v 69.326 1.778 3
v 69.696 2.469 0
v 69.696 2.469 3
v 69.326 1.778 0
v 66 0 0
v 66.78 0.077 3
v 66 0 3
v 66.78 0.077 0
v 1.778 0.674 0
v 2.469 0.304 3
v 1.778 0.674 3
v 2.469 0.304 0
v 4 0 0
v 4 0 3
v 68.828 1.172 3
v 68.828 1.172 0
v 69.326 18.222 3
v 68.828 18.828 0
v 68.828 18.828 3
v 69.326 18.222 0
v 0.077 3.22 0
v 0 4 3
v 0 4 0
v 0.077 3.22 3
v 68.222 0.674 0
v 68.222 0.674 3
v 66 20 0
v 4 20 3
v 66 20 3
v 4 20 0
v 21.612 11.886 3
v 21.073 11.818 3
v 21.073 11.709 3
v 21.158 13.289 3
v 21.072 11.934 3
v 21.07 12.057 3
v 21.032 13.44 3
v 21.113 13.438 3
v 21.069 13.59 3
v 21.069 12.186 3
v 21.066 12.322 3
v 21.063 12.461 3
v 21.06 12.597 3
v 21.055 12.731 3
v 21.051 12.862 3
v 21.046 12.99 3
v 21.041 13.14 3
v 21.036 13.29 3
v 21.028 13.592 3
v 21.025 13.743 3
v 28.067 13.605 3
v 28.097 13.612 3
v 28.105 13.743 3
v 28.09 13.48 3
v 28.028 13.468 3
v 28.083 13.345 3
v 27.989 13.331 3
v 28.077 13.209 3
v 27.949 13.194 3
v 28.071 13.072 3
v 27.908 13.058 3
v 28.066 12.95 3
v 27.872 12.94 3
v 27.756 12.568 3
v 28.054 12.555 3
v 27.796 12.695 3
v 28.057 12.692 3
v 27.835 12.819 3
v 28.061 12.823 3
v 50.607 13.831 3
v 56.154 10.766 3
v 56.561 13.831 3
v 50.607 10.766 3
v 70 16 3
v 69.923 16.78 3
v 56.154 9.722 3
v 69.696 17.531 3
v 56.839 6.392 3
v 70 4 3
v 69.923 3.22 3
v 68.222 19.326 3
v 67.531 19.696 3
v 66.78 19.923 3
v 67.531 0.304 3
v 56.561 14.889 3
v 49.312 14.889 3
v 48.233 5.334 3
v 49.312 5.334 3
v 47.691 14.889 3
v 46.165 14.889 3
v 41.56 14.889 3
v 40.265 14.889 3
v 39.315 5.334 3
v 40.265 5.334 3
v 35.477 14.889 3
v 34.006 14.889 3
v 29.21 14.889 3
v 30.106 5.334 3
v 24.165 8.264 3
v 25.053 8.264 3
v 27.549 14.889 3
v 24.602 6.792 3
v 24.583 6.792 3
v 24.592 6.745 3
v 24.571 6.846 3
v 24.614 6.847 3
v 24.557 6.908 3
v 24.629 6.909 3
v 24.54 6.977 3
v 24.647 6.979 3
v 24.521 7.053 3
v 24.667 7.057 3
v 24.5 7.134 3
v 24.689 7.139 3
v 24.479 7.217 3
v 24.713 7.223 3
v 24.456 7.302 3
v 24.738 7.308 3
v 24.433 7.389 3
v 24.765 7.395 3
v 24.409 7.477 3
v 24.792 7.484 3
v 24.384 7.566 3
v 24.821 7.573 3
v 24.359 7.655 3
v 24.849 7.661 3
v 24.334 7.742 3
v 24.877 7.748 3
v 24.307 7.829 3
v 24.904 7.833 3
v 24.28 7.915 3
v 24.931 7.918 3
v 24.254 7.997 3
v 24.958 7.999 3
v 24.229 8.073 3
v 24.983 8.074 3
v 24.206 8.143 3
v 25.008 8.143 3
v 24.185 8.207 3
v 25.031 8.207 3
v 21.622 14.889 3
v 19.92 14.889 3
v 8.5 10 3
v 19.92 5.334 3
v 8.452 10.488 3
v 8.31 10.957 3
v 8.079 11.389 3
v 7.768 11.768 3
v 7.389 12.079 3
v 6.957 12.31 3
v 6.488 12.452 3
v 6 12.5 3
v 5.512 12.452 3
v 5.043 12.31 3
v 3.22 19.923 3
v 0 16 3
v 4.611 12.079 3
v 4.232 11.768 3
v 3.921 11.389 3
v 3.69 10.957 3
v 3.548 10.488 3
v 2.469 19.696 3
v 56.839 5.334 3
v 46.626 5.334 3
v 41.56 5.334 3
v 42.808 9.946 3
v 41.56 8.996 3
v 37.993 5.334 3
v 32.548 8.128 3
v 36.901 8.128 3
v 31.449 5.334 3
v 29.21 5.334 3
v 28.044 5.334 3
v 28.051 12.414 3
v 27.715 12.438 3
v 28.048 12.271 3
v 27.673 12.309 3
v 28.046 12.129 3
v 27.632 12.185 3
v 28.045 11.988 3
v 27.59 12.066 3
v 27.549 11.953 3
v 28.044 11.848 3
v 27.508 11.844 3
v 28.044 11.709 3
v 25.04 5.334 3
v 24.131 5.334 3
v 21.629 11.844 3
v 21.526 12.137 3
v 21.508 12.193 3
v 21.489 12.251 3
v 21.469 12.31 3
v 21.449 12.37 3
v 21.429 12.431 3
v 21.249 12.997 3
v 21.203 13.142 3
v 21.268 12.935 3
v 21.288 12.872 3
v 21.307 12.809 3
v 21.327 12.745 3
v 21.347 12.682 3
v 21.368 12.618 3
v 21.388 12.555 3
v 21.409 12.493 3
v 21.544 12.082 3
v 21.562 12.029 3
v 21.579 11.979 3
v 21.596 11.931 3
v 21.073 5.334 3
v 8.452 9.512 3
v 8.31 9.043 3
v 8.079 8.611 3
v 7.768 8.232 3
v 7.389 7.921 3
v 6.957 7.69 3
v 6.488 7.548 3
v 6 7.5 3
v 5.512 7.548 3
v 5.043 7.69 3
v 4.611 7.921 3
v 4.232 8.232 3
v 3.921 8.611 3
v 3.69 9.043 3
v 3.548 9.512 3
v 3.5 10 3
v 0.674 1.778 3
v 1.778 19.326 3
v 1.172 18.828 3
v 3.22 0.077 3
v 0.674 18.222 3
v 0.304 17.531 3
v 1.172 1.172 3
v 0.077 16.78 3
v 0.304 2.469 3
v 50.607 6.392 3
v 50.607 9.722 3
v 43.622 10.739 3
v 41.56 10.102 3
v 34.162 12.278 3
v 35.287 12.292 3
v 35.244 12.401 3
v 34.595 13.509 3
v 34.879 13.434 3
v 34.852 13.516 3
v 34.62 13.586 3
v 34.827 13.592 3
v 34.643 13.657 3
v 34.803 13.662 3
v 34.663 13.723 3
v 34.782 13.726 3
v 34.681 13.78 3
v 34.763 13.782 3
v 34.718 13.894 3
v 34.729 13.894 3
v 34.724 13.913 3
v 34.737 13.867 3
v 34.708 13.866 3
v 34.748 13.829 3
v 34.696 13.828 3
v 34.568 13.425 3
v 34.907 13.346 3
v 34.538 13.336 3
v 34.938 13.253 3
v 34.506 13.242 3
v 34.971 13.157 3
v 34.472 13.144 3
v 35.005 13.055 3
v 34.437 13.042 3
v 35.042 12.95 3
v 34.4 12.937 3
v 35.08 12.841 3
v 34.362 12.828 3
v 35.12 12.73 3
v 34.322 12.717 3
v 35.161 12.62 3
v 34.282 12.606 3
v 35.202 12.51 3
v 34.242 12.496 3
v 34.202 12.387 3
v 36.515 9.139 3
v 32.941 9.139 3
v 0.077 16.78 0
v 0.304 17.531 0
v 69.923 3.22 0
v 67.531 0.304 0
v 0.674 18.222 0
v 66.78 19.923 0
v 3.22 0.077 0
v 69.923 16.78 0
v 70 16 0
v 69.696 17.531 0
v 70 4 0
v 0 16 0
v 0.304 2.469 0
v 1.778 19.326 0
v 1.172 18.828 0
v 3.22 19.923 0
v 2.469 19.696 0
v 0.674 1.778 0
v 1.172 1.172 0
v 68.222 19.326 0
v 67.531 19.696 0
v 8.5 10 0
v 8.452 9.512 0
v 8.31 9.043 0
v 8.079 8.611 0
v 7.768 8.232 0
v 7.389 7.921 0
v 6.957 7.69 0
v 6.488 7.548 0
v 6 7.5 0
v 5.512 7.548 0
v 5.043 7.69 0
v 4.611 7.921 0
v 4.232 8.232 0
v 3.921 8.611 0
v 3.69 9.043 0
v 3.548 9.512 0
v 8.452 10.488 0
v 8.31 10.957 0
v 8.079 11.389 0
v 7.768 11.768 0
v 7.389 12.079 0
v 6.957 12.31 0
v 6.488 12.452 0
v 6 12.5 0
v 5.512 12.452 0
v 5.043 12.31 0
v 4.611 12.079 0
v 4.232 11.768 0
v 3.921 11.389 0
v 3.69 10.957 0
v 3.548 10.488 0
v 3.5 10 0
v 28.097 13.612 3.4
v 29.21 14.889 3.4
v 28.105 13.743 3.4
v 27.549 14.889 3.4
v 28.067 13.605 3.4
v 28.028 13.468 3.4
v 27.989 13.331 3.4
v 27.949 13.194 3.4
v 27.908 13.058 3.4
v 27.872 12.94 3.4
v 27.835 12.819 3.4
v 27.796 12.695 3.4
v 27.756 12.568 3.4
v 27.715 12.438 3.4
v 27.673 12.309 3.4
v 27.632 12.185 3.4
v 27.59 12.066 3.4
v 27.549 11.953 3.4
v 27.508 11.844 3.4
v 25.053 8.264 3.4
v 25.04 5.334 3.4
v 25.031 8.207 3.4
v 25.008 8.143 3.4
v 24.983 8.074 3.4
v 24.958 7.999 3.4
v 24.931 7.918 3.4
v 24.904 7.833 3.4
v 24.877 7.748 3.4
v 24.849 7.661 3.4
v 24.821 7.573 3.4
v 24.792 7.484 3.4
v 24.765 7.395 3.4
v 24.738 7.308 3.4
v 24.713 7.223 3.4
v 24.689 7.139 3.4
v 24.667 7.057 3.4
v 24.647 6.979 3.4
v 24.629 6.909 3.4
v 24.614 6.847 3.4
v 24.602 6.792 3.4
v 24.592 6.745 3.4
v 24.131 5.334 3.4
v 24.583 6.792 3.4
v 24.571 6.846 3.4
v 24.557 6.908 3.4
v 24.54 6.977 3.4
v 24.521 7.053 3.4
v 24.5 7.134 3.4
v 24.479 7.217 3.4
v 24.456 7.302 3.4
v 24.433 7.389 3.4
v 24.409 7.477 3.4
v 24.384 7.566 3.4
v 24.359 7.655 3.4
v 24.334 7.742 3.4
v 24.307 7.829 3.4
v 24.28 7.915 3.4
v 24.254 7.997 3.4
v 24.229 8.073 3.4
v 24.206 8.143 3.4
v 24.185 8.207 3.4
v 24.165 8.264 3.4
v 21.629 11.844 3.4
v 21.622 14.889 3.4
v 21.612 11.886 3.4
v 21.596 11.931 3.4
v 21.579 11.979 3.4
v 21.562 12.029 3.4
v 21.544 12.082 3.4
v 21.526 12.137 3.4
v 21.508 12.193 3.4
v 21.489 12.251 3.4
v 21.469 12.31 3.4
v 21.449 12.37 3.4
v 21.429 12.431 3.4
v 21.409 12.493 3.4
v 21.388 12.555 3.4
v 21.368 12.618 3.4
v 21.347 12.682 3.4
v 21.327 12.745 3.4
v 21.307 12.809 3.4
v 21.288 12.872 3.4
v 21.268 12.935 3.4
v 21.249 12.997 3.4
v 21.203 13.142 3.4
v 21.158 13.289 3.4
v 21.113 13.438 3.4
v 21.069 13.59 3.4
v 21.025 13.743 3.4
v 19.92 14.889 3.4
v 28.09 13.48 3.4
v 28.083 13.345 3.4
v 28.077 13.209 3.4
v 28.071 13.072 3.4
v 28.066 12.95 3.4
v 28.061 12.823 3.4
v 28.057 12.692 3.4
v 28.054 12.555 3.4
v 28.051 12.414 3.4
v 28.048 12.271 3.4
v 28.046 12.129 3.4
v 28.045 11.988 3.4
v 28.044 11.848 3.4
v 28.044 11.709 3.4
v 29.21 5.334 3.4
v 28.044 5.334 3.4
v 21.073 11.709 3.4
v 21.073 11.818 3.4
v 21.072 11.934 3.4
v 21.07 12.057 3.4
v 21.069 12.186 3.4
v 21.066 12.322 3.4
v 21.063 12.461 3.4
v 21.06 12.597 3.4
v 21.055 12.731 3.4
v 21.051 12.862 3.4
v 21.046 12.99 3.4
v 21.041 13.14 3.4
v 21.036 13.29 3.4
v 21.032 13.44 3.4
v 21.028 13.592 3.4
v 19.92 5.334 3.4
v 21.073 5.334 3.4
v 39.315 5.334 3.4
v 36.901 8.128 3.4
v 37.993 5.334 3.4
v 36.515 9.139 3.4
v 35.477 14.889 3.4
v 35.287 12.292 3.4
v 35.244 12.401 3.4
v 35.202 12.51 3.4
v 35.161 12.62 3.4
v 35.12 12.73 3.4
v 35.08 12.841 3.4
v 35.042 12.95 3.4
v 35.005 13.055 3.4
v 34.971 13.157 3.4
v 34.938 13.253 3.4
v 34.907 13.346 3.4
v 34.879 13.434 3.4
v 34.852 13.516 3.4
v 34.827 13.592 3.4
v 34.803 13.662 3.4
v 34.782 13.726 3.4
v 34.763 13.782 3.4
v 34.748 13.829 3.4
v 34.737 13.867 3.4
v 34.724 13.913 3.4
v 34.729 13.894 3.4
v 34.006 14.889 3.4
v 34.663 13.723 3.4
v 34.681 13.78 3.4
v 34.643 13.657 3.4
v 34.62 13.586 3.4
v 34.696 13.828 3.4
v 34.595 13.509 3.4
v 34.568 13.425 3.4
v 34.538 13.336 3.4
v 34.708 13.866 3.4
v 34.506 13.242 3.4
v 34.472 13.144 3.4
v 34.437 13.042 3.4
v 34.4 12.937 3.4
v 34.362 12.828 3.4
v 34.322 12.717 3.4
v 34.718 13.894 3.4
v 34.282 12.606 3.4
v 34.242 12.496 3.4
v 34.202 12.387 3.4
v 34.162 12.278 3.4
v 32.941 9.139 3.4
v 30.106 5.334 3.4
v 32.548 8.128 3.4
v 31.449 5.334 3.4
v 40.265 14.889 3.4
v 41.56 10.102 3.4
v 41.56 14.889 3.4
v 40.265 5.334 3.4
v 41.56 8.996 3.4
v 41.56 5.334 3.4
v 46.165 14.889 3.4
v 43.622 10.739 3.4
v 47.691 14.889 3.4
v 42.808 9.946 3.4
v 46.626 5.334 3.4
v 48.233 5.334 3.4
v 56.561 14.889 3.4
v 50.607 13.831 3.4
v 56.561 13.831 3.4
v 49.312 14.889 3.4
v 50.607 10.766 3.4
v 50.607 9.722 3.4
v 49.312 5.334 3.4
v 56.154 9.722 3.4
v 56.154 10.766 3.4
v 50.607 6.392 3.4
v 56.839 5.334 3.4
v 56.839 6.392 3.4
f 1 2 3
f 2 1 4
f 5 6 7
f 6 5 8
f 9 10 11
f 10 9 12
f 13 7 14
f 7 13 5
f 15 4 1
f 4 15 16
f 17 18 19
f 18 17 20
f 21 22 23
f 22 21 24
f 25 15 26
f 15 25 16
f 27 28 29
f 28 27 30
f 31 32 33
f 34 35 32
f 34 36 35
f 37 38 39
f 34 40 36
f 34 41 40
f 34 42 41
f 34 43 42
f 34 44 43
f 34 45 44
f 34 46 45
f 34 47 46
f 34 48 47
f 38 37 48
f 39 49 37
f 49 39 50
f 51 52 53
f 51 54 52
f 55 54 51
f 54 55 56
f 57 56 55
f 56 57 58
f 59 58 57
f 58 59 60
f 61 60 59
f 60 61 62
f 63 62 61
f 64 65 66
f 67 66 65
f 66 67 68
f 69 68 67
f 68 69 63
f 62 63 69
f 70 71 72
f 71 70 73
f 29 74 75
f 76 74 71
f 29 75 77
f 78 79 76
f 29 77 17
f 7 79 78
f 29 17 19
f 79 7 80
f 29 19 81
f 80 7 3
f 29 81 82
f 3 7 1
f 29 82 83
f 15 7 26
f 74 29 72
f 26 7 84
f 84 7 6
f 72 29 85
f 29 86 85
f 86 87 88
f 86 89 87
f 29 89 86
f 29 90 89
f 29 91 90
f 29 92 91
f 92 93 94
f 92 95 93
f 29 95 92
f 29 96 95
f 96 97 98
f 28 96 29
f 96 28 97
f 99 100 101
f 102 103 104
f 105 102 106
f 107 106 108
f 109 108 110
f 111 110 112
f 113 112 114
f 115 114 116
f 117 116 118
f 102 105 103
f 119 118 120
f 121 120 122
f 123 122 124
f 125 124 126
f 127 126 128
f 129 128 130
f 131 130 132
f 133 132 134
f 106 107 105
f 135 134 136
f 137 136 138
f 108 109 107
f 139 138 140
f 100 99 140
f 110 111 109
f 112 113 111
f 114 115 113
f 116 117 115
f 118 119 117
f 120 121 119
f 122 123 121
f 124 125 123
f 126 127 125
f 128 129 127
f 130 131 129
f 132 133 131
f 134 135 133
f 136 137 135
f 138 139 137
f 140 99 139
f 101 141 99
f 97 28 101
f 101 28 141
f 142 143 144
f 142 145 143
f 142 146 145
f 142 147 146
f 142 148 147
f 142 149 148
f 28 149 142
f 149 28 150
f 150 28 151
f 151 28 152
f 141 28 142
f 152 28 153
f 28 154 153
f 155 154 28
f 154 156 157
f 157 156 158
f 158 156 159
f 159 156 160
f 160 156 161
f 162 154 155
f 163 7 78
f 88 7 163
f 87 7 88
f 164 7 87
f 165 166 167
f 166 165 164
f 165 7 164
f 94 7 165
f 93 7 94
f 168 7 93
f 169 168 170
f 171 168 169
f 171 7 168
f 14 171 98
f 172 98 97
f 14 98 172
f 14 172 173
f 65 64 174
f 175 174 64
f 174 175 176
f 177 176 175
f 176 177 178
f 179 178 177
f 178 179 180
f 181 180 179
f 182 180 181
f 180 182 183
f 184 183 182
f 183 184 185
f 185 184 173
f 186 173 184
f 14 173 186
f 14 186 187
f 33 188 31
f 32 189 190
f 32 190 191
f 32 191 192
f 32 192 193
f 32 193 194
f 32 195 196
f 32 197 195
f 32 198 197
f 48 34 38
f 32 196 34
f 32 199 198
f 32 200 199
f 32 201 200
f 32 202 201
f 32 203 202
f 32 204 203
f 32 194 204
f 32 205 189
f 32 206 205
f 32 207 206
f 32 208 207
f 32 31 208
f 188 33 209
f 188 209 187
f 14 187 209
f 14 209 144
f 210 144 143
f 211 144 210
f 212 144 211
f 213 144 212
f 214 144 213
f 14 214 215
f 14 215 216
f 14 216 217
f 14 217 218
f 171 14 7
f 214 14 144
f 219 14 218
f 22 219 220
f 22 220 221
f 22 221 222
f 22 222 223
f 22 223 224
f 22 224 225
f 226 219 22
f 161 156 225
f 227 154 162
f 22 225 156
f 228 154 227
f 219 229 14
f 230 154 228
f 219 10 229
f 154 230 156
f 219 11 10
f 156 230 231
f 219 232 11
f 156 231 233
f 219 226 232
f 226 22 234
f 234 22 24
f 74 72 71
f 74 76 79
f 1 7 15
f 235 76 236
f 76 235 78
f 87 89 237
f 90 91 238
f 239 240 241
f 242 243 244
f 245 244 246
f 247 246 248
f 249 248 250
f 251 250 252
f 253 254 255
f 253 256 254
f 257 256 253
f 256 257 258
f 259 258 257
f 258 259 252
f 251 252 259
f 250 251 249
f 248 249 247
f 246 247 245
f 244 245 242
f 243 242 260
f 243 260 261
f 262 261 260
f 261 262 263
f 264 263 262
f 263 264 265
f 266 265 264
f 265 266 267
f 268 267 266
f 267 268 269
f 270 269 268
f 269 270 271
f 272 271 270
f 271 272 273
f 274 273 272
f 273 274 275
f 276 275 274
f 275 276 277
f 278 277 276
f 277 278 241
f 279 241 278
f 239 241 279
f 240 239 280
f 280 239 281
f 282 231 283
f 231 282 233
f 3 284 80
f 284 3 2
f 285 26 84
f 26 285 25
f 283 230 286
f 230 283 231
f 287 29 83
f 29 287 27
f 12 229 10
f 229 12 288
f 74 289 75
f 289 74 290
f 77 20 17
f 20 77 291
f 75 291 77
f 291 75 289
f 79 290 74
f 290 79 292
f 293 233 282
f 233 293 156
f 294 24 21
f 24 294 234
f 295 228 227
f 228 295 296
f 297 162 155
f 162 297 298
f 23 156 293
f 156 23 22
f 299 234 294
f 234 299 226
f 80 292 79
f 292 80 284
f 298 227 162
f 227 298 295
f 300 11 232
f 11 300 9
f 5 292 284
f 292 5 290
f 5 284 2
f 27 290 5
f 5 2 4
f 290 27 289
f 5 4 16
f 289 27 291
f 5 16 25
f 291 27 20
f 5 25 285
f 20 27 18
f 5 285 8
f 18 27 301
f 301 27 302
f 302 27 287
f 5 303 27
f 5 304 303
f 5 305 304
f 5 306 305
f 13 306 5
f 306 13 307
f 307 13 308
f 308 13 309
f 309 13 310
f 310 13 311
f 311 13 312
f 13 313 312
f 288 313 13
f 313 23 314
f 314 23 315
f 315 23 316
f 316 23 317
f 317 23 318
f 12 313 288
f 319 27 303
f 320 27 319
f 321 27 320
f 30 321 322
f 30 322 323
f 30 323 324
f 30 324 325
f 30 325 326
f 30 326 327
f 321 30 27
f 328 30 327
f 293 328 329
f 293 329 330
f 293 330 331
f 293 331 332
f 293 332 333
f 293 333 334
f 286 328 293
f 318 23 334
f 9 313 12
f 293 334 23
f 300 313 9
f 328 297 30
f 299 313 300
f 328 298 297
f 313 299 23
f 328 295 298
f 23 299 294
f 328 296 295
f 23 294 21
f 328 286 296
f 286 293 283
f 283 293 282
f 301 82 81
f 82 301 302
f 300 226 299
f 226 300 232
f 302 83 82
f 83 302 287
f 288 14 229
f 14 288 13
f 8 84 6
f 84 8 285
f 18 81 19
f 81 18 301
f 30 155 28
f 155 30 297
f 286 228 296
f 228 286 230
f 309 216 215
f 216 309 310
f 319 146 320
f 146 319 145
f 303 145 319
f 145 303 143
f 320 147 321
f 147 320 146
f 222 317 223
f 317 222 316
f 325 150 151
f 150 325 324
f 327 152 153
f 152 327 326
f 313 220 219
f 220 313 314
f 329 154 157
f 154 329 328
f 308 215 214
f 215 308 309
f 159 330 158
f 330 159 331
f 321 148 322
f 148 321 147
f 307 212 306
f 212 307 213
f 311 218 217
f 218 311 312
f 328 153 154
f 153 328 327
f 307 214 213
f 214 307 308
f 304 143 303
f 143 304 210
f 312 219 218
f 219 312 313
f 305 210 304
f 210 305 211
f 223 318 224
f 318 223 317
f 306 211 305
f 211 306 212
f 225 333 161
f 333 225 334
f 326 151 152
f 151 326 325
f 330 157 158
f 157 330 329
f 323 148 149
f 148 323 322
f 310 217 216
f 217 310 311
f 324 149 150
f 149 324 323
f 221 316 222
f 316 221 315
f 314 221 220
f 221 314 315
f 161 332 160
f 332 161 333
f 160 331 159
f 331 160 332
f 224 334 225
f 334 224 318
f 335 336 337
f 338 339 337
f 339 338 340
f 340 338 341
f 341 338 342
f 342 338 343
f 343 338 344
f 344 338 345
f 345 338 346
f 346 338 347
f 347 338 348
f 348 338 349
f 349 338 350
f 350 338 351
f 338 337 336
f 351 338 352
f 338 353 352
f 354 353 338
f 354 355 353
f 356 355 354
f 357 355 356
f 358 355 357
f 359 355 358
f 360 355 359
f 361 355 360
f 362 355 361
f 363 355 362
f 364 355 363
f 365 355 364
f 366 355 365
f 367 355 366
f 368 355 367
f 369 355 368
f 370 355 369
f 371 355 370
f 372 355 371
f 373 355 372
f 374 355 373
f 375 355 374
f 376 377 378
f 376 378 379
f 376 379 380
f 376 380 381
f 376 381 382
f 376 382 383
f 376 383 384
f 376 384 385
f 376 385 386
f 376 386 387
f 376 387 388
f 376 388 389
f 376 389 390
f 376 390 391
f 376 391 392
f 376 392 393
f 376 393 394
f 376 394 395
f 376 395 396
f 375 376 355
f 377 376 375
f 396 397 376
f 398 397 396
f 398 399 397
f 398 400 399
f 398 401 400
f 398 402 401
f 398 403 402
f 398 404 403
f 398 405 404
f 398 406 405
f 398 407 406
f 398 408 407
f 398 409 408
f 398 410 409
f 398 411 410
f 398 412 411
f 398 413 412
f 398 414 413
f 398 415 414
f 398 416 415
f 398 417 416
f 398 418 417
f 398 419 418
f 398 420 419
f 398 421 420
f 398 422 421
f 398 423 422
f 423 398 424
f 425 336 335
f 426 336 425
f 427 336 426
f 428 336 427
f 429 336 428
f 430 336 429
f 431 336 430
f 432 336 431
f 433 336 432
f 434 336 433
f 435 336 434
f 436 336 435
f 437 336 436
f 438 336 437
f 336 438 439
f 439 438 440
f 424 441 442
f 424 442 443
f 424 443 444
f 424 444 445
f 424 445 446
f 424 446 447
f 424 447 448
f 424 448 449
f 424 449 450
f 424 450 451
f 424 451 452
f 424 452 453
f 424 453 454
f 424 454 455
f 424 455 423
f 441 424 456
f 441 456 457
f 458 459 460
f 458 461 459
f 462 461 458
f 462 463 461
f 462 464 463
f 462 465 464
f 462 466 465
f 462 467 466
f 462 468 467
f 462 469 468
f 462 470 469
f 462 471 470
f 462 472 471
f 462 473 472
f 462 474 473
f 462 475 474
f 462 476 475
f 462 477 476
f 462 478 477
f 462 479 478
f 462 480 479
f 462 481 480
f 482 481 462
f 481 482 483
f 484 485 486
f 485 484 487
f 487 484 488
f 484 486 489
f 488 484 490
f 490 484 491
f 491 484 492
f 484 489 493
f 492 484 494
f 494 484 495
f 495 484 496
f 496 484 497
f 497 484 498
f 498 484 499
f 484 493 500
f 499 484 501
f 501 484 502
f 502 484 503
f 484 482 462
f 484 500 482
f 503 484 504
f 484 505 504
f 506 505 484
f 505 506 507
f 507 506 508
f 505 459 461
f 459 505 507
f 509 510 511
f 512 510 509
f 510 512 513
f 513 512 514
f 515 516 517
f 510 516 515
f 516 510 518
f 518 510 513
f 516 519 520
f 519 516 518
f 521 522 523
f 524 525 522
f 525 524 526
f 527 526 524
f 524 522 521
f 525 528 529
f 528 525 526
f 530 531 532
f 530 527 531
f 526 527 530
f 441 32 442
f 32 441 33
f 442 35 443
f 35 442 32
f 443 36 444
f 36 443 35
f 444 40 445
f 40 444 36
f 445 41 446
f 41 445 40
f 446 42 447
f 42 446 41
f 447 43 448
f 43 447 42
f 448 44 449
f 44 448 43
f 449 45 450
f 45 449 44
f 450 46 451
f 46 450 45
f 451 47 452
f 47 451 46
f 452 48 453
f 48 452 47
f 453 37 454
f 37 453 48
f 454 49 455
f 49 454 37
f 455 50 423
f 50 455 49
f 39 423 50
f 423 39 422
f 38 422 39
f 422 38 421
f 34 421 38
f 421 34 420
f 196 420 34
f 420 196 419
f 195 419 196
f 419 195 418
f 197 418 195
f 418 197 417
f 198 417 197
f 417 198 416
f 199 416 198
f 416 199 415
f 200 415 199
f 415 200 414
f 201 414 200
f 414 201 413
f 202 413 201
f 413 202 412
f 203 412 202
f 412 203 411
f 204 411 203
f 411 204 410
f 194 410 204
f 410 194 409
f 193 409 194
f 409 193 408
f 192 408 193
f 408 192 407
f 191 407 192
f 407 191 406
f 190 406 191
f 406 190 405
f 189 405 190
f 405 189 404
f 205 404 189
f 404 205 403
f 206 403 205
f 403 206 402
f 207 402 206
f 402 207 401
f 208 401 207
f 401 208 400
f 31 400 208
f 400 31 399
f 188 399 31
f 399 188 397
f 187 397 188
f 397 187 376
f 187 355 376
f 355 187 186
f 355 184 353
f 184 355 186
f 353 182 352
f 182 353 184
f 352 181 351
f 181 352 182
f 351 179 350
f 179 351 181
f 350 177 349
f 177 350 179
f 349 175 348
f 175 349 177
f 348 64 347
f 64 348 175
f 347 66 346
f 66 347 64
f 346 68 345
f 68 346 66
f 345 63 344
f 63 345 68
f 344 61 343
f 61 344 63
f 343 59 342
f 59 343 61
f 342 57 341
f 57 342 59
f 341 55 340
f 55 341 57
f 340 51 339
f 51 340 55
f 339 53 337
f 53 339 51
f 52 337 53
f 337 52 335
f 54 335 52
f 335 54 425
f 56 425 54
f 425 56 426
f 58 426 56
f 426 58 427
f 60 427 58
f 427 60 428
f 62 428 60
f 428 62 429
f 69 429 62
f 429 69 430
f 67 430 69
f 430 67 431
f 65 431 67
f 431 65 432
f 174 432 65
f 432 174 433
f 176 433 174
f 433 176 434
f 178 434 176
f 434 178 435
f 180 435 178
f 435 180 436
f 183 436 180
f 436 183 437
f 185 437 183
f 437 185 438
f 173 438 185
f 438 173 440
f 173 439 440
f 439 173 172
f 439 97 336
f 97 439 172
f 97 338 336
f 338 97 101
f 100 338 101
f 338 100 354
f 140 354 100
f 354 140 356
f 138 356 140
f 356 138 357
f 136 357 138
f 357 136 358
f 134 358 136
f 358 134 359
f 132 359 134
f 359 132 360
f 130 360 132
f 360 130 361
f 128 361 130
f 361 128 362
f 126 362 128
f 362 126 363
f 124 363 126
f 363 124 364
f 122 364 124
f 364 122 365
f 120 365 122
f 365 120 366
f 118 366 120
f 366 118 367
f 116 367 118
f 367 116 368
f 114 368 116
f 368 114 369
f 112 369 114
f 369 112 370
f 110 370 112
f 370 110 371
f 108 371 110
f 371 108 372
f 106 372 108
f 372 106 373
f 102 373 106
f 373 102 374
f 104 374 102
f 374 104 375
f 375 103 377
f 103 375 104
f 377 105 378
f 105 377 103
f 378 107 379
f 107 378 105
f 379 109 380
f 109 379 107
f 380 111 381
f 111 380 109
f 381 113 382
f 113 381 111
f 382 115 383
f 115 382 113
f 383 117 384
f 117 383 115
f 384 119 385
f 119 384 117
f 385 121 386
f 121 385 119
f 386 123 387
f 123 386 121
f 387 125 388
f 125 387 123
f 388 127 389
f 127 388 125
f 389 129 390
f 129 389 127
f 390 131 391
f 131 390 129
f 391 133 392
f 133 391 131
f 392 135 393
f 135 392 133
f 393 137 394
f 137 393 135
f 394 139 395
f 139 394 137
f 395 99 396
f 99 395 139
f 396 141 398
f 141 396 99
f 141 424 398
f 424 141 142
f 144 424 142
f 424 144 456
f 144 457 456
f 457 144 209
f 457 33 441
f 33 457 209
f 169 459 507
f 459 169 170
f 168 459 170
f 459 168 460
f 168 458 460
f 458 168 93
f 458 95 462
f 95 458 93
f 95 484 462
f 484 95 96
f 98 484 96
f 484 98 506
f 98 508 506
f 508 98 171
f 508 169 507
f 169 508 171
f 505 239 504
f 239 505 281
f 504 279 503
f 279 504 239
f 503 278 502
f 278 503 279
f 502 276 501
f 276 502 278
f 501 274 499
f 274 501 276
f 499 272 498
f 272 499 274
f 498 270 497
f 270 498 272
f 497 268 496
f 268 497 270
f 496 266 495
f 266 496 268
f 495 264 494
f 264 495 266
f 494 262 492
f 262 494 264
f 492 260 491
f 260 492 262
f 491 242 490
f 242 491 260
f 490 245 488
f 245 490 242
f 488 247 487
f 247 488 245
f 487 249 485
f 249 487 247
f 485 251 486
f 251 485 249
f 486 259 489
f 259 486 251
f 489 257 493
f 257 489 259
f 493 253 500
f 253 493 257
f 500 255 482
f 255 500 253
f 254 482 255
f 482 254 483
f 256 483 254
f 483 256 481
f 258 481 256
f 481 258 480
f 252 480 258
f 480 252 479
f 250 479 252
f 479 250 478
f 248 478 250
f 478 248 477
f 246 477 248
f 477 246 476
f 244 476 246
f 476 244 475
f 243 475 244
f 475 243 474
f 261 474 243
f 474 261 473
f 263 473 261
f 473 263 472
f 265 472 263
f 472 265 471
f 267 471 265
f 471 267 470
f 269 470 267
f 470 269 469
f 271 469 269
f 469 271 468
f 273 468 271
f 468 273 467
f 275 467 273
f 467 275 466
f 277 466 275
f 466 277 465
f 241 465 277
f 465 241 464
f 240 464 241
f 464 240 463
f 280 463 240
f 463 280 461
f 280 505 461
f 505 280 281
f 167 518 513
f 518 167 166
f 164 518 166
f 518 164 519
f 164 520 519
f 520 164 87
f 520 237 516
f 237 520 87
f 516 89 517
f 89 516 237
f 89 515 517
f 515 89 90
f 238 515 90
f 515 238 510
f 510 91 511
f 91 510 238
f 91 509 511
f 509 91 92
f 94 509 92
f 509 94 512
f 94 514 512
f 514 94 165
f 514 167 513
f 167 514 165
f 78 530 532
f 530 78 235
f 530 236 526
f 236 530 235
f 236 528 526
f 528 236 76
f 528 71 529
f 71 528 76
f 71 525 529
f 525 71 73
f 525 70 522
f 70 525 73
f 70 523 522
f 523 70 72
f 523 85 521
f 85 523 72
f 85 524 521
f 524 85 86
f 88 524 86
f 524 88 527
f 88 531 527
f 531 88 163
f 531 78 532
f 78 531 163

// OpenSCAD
/* [Text] */
// The text to put on the keychain
text_value = "MAKE";
// Text height (mm)
font_size = 10; // [5:24]

/* [Shape] */
// Plate width (mm)
plate_width = 70; // [30:150]
// Plate height (mm)
plate_height = 20; // [10:60]
// Plate thickness (mm)
plate_thickness = 3; // [1:0.5:8]
// Include a hole for a keyring
with_hole = true;

/* [Hidden] */
$fn = 32;
corner_r = 4;
hole_r = 2.5;
text_inset = plate_thickness / 2;

module plate() {
    difference() {
        hull() {
            for (x = [corner_r, plate_width - corner_r])
                for (y = [corner_r, plate_height - corner_r])
                    translate([x, y, 0]) cylinder(r = corner_r, h = plate_thickness);
        }
        if (with_hole) {
            translate([corner_r + 2, plate_height / 2, -1])
                cylinder(r = hole_r, h = plate_thickness + 2);
        }
    }
}

module engraving() {
    text_x = plate_width / 2 + (with_hole ? (corner_r + 2) / 2 : 0);
    translate([text_x, plate_height / 2, plate_thickness - text_inset])
        linear_extrude(height = text_inset + 0.4)
            text(text_value, size = font_size, halign = "center", valign = "center");
}

plate();
engraving();
